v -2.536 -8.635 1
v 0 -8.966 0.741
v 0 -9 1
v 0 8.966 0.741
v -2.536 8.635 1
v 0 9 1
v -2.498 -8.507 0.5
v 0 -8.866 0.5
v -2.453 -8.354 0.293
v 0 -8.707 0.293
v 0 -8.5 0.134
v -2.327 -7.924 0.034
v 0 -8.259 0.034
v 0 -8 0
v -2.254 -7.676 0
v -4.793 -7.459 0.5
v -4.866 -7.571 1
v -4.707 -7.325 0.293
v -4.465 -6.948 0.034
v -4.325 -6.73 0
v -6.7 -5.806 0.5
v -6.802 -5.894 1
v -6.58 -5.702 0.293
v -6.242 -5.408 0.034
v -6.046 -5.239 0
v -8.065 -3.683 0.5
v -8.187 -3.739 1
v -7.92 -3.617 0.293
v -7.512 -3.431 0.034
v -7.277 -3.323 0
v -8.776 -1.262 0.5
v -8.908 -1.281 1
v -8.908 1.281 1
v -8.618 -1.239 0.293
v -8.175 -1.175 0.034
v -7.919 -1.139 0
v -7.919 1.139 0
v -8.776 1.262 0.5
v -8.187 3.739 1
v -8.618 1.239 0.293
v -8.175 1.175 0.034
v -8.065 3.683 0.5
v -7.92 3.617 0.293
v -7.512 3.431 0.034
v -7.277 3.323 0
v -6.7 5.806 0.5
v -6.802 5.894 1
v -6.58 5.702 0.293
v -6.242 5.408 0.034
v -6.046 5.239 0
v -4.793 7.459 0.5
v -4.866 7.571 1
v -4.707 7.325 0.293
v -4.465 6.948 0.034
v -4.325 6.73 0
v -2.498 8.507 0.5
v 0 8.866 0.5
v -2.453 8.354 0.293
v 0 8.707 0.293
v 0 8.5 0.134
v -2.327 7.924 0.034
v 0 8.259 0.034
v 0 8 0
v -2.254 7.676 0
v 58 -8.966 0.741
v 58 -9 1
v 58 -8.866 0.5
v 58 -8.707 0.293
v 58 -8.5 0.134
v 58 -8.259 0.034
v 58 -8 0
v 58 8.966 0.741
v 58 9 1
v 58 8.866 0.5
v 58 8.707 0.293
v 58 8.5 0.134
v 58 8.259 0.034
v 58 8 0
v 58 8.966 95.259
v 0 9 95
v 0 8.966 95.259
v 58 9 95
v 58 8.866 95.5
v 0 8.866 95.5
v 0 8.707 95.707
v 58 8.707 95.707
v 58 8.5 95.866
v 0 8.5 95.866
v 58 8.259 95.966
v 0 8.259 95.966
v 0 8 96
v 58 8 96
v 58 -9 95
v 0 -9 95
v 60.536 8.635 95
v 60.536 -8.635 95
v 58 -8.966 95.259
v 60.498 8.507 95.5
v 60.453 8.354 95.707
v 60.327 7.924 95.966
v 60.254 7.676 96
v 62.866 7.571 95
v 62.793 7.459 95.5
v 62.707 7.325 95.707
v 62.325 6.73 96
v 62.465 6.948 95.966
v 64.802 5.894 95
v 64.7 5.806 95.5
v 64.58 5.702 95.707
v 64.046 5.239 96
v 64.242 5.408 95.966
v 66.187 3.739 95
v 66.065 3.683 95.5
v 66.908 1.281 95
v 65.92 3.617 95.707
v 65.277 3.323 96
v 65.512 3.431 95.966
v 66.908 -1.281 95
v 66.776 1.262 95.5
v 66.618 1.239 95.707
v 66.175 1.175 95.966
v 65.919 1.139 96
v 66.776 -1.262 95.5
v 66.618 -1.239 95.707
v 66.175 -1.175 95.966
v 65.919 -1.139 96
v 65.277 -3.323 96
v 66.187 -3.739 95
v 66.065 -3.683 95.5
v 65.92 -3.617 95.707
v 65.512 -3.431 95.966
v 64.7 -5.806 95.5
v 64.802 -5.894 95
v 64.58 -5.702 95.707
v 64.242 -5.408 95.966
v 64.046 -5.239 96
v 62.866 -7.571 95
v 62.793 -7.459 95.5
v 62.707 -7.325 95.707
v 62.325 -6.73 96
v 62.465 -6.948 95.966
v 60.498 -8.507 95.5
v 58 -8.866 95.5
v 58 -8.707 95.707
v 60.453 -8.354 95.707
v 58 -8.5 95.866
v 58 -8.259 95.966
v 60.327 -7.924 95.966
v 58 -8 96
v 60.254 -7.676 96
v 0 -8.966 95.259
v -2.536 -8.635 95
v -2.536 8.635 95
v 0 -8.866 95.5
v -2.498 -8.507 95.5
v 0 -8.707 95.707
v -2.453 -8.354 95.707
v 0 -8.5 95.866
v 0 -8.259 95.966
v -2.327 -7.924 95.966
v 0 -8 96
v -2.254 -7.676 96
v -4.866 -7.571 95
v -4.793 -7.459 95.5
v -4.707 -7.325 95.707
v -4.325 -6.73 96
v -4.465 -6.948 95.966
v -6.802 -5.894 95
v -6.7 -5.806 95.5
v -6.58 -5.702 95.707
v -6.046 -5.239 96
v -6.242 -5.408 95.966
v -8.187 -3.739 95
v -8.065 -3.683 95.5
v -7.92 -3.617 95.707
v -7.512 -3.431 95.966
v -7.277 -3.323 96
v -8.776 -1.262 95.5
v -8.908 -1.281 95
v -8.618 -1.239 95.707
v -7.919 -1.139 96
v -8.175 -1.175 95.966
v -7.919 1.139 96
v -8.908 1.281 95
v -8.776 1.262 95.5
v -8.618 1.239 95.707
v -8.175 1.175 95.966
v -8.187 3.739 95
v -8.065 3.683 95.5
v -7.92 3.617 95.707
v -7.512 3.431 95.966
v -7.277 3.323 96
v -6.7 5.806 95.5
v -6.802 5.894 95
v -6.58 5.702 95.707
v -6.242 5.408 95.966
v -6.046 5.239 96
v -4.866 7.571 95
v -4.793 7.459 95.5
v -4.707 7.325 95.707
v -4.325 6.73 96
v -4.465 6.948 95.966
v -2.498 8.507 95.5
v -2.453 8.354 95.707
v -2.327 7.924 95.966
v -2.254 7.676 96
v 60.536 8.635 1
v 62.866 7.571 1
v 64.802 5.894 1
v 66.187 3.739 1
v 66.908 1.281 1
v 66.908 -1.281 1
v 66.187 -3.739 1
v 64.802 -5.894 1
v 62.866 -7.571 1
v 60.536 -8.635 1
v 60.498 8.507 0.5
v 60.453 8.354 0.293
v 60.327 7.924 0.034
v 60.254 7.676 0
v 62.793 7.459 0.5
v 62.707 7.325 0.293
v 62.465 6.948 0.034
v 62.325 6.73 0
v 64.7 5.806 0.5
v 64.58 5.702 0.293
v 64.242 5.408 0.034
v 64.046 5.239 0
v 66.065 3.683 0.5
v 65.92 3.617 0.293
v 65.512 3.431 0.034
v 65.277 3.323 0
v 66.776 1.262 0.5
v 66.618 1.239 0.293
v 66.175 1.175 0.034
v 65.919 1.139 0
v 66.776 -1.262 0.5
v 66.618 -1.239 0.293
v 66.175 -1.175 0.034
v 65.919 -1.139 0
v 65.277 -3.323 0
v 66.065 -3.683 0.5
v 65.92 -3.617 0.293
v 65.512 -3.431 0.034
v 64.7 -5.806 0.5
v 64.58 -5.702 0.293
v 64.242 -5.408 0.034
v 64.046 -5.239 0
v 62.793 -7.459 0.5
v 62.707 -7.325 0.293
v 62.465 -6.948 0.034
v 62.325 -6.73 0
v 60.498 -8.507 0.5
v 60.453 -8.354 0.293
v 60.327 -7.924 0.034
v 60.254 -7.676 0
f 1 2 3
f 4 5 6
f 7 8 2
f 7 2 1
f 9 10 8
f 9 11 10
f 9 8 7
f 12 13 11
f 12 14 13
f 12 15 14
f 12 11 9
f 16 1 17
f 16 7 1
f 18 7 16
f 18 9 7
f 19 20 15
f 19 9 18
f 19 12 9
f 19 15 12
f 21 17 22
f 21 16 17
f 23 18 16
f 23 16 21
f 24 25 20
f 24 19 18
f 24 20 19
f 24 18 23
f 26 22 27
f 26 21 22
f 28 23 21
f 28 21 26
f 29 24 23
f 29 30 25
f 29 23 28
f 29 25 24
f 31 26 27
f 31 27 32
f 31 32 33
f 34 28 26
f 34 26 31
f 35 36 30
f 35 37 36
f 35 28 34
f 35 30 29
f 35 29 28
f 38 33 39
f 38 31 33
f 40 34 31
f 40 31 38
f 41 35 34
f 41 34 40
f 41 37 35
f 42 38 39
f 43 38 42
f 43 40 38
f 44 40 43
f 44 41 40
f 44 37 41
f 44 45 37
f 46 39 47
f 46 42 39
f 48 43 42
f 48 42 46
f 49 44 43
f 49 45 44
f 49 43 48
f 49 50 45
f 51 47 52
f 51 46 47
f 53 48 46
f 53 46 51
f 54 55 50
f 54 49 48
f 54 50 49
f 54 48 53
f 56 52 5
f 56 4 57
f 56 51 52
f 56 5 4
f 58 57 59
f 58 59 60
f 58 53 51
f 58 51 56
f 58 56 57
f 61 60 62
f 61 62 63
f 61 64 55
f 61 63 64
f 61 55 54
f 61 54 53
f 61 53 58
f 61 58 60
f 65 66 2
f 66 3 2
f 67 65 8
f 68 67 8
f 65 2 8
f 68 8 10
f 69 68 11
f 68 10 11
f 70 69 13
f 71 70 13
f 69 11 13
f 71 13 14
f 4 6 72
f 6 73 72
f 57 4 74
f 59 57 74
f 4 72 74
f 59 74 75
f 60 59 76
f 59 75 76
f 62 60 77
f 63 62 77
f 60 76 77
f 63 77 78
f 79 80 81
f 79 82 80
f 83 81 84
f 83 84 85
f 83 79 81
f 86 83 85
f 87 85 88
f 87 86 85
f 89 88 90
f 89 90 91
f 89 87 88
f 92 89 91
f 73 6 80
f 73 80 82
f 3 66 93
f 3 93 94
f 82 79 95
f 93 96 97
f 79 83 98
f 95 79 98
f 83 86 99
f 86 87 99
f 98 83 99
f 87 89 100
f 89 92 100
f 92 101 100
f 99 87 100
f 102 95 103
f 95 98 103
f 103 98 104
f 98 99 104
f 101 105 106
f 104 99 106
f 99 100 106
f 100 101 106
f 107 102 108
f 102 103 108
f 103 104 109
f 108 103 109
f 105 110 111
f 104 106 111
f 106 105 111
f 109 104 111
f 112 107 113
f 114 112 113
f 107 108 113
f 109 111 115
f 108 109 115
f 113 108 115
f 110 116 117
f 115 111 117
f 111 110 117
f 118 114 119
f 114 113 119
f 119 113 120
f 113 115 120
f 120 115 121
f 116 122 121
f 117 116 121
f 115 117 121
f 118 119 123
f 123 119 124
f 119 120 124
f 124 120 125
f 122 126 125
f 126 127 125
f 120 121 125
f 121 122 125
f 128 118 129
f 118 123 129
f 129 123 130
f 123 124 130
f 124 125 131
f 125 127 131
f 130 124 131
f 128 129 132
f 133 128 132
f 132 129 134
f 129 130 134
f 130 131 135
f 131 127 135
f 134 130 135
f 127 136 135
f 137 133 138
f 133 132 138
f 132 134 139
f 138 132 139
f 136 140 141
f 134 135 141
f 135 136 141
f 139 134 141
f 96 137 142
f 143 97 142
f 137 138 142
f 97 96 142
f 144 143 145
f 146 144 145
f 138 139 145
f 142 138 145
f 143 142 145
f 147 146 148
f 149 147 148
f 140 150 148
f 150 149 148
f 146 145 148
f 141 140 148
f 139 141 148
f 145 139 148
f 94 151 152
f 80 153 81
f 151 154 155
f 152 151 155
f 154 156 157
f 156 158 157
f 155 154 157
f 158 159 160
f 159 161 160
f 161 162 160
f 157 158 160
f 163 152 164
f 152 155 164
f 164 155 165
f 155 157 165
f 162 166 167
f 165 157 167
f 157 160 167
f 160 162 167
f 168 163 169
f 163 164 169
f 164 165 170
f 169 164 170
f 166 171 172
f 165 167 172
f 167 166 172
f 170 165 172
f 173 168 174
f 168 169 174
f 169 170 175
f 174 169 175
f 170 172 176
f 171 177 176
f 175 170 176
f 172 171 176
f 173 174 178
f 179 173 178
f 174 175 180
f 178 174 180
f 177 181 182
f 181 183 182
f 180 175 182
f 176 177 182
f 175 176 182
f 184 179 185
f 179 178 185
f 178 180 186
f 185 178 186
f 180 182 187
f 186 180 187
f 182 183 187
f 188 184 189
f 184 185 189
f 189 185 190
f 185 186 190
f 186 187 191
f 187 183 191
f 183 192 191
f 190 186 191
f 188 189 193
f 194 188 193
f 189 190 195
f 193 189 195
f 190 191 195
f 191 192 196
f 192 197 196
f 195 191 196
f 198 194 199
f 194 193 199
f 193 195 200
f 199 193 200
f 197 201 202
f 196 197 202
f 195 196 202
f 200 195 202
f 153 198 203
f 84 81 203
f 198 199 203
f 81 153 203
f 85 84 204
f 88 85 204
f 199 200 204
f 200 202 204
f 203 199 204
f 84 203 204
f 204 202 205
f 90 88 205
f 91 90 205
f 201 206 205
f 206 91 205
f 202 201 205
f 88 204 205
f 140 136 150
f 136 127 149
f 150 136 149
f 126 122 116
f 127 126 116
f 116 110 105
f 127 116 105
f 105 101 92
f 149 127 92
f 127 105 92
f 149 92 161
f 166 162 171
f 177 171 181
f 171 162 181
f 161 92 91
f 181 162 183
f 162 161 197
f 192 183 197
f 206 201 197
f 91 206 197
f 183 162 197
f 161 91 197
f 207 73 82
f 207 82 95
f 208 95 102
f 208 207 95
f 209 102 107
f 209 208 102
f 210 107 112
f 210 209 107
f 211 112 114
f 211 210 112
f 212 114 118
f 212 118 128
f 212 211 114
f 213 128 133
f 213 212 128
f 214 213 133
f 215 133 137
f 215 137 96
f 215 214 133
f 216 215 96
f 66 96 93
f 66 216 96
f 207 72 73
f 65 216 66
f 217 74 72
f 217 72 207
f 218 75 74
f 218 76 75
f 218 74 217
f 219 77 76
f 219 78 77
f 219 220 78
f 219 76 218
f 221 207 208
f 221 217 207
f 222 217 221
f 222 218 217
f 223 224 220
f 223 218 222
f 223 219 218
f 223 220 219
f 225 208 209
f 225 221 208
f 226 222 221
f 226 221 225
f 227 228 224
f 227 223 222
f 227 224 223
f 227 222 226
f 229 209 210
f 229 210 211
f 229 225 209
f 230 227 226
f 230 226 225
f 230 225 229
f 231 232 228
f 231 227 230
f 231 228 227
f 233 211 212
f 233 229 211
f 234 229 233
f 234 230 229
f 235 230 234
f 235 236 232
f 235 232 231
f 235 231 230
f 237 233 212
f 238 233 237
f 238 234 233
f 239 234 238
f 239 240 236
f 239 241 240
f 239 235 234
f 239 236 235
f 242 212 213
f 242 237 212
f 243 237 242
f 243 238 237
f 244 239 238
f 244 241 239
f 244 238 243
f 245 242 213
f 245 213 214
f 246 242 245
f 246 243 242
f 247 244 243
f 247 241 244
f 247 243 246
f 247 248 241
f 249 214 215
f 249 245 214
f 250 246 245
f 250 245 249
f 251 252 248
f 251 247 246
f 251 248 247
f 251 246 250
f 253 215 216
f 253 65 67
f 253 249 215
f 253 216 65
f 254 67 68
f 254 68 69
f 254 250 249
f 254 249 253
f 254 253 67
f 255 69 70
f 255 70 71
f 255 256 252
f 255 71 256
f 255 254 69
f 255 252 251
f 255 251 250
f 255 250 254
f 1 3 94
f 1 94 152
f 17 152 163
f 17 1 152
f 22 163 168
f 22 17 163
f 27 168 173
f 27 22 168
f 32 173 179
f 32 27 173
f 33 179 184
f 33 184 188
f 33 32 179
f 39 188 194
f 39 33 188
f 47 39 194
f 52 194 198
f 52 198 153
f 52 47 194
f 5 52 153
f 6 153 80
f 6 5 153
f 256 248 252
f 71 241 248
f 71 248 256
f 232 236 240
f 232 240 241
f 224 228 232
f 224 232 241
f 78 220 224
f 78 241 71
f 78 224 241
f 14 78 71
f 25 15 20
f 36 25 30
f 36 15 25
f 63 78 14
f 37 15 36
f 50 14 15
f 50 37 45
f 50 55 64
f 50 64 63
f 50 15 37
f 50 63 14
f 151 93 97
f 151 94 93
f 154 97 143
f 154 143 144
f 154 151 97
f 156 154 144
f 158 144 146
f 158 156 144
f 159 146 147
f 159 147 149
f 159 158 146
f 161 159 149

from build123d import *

# Parameters (mm, degrees)
BOSS_EXTRU_1_DEPTH = 96
CONG_1_R           = 1


with BuildPart() as part:
    # Esquisse1 → Boss.-Extru.1 (new body)
    with BuildSketch(Plane.XY):
        with BuildLine():
            Line((0, 9), (58, 9))
            ThreePointArc((58, 9), (67, 0), (58, -9))
            Line((58, -9), (0, -9))
            ThreePointArc((0, -9), (-9, 0), (0, 9))
        make_face()
    extrude(amount=BOSS_EXTRU_1_DEPTH)

    # Congé1
    cong_1_edges = [part.edges().sort_by_distance(p)[0] for p in [
        (67, 0, 96),
        (29, 9, 96),
        (-9, 0, 96),
        (29, 9, 0),
        (67, 0, 0),
        (29, -9, 0),
        (-9, 0, 0),
        (29, -9, 96),
    ]]
    fillet(cong_1_edges, radius=CONG_1_R)


solid = part.part
